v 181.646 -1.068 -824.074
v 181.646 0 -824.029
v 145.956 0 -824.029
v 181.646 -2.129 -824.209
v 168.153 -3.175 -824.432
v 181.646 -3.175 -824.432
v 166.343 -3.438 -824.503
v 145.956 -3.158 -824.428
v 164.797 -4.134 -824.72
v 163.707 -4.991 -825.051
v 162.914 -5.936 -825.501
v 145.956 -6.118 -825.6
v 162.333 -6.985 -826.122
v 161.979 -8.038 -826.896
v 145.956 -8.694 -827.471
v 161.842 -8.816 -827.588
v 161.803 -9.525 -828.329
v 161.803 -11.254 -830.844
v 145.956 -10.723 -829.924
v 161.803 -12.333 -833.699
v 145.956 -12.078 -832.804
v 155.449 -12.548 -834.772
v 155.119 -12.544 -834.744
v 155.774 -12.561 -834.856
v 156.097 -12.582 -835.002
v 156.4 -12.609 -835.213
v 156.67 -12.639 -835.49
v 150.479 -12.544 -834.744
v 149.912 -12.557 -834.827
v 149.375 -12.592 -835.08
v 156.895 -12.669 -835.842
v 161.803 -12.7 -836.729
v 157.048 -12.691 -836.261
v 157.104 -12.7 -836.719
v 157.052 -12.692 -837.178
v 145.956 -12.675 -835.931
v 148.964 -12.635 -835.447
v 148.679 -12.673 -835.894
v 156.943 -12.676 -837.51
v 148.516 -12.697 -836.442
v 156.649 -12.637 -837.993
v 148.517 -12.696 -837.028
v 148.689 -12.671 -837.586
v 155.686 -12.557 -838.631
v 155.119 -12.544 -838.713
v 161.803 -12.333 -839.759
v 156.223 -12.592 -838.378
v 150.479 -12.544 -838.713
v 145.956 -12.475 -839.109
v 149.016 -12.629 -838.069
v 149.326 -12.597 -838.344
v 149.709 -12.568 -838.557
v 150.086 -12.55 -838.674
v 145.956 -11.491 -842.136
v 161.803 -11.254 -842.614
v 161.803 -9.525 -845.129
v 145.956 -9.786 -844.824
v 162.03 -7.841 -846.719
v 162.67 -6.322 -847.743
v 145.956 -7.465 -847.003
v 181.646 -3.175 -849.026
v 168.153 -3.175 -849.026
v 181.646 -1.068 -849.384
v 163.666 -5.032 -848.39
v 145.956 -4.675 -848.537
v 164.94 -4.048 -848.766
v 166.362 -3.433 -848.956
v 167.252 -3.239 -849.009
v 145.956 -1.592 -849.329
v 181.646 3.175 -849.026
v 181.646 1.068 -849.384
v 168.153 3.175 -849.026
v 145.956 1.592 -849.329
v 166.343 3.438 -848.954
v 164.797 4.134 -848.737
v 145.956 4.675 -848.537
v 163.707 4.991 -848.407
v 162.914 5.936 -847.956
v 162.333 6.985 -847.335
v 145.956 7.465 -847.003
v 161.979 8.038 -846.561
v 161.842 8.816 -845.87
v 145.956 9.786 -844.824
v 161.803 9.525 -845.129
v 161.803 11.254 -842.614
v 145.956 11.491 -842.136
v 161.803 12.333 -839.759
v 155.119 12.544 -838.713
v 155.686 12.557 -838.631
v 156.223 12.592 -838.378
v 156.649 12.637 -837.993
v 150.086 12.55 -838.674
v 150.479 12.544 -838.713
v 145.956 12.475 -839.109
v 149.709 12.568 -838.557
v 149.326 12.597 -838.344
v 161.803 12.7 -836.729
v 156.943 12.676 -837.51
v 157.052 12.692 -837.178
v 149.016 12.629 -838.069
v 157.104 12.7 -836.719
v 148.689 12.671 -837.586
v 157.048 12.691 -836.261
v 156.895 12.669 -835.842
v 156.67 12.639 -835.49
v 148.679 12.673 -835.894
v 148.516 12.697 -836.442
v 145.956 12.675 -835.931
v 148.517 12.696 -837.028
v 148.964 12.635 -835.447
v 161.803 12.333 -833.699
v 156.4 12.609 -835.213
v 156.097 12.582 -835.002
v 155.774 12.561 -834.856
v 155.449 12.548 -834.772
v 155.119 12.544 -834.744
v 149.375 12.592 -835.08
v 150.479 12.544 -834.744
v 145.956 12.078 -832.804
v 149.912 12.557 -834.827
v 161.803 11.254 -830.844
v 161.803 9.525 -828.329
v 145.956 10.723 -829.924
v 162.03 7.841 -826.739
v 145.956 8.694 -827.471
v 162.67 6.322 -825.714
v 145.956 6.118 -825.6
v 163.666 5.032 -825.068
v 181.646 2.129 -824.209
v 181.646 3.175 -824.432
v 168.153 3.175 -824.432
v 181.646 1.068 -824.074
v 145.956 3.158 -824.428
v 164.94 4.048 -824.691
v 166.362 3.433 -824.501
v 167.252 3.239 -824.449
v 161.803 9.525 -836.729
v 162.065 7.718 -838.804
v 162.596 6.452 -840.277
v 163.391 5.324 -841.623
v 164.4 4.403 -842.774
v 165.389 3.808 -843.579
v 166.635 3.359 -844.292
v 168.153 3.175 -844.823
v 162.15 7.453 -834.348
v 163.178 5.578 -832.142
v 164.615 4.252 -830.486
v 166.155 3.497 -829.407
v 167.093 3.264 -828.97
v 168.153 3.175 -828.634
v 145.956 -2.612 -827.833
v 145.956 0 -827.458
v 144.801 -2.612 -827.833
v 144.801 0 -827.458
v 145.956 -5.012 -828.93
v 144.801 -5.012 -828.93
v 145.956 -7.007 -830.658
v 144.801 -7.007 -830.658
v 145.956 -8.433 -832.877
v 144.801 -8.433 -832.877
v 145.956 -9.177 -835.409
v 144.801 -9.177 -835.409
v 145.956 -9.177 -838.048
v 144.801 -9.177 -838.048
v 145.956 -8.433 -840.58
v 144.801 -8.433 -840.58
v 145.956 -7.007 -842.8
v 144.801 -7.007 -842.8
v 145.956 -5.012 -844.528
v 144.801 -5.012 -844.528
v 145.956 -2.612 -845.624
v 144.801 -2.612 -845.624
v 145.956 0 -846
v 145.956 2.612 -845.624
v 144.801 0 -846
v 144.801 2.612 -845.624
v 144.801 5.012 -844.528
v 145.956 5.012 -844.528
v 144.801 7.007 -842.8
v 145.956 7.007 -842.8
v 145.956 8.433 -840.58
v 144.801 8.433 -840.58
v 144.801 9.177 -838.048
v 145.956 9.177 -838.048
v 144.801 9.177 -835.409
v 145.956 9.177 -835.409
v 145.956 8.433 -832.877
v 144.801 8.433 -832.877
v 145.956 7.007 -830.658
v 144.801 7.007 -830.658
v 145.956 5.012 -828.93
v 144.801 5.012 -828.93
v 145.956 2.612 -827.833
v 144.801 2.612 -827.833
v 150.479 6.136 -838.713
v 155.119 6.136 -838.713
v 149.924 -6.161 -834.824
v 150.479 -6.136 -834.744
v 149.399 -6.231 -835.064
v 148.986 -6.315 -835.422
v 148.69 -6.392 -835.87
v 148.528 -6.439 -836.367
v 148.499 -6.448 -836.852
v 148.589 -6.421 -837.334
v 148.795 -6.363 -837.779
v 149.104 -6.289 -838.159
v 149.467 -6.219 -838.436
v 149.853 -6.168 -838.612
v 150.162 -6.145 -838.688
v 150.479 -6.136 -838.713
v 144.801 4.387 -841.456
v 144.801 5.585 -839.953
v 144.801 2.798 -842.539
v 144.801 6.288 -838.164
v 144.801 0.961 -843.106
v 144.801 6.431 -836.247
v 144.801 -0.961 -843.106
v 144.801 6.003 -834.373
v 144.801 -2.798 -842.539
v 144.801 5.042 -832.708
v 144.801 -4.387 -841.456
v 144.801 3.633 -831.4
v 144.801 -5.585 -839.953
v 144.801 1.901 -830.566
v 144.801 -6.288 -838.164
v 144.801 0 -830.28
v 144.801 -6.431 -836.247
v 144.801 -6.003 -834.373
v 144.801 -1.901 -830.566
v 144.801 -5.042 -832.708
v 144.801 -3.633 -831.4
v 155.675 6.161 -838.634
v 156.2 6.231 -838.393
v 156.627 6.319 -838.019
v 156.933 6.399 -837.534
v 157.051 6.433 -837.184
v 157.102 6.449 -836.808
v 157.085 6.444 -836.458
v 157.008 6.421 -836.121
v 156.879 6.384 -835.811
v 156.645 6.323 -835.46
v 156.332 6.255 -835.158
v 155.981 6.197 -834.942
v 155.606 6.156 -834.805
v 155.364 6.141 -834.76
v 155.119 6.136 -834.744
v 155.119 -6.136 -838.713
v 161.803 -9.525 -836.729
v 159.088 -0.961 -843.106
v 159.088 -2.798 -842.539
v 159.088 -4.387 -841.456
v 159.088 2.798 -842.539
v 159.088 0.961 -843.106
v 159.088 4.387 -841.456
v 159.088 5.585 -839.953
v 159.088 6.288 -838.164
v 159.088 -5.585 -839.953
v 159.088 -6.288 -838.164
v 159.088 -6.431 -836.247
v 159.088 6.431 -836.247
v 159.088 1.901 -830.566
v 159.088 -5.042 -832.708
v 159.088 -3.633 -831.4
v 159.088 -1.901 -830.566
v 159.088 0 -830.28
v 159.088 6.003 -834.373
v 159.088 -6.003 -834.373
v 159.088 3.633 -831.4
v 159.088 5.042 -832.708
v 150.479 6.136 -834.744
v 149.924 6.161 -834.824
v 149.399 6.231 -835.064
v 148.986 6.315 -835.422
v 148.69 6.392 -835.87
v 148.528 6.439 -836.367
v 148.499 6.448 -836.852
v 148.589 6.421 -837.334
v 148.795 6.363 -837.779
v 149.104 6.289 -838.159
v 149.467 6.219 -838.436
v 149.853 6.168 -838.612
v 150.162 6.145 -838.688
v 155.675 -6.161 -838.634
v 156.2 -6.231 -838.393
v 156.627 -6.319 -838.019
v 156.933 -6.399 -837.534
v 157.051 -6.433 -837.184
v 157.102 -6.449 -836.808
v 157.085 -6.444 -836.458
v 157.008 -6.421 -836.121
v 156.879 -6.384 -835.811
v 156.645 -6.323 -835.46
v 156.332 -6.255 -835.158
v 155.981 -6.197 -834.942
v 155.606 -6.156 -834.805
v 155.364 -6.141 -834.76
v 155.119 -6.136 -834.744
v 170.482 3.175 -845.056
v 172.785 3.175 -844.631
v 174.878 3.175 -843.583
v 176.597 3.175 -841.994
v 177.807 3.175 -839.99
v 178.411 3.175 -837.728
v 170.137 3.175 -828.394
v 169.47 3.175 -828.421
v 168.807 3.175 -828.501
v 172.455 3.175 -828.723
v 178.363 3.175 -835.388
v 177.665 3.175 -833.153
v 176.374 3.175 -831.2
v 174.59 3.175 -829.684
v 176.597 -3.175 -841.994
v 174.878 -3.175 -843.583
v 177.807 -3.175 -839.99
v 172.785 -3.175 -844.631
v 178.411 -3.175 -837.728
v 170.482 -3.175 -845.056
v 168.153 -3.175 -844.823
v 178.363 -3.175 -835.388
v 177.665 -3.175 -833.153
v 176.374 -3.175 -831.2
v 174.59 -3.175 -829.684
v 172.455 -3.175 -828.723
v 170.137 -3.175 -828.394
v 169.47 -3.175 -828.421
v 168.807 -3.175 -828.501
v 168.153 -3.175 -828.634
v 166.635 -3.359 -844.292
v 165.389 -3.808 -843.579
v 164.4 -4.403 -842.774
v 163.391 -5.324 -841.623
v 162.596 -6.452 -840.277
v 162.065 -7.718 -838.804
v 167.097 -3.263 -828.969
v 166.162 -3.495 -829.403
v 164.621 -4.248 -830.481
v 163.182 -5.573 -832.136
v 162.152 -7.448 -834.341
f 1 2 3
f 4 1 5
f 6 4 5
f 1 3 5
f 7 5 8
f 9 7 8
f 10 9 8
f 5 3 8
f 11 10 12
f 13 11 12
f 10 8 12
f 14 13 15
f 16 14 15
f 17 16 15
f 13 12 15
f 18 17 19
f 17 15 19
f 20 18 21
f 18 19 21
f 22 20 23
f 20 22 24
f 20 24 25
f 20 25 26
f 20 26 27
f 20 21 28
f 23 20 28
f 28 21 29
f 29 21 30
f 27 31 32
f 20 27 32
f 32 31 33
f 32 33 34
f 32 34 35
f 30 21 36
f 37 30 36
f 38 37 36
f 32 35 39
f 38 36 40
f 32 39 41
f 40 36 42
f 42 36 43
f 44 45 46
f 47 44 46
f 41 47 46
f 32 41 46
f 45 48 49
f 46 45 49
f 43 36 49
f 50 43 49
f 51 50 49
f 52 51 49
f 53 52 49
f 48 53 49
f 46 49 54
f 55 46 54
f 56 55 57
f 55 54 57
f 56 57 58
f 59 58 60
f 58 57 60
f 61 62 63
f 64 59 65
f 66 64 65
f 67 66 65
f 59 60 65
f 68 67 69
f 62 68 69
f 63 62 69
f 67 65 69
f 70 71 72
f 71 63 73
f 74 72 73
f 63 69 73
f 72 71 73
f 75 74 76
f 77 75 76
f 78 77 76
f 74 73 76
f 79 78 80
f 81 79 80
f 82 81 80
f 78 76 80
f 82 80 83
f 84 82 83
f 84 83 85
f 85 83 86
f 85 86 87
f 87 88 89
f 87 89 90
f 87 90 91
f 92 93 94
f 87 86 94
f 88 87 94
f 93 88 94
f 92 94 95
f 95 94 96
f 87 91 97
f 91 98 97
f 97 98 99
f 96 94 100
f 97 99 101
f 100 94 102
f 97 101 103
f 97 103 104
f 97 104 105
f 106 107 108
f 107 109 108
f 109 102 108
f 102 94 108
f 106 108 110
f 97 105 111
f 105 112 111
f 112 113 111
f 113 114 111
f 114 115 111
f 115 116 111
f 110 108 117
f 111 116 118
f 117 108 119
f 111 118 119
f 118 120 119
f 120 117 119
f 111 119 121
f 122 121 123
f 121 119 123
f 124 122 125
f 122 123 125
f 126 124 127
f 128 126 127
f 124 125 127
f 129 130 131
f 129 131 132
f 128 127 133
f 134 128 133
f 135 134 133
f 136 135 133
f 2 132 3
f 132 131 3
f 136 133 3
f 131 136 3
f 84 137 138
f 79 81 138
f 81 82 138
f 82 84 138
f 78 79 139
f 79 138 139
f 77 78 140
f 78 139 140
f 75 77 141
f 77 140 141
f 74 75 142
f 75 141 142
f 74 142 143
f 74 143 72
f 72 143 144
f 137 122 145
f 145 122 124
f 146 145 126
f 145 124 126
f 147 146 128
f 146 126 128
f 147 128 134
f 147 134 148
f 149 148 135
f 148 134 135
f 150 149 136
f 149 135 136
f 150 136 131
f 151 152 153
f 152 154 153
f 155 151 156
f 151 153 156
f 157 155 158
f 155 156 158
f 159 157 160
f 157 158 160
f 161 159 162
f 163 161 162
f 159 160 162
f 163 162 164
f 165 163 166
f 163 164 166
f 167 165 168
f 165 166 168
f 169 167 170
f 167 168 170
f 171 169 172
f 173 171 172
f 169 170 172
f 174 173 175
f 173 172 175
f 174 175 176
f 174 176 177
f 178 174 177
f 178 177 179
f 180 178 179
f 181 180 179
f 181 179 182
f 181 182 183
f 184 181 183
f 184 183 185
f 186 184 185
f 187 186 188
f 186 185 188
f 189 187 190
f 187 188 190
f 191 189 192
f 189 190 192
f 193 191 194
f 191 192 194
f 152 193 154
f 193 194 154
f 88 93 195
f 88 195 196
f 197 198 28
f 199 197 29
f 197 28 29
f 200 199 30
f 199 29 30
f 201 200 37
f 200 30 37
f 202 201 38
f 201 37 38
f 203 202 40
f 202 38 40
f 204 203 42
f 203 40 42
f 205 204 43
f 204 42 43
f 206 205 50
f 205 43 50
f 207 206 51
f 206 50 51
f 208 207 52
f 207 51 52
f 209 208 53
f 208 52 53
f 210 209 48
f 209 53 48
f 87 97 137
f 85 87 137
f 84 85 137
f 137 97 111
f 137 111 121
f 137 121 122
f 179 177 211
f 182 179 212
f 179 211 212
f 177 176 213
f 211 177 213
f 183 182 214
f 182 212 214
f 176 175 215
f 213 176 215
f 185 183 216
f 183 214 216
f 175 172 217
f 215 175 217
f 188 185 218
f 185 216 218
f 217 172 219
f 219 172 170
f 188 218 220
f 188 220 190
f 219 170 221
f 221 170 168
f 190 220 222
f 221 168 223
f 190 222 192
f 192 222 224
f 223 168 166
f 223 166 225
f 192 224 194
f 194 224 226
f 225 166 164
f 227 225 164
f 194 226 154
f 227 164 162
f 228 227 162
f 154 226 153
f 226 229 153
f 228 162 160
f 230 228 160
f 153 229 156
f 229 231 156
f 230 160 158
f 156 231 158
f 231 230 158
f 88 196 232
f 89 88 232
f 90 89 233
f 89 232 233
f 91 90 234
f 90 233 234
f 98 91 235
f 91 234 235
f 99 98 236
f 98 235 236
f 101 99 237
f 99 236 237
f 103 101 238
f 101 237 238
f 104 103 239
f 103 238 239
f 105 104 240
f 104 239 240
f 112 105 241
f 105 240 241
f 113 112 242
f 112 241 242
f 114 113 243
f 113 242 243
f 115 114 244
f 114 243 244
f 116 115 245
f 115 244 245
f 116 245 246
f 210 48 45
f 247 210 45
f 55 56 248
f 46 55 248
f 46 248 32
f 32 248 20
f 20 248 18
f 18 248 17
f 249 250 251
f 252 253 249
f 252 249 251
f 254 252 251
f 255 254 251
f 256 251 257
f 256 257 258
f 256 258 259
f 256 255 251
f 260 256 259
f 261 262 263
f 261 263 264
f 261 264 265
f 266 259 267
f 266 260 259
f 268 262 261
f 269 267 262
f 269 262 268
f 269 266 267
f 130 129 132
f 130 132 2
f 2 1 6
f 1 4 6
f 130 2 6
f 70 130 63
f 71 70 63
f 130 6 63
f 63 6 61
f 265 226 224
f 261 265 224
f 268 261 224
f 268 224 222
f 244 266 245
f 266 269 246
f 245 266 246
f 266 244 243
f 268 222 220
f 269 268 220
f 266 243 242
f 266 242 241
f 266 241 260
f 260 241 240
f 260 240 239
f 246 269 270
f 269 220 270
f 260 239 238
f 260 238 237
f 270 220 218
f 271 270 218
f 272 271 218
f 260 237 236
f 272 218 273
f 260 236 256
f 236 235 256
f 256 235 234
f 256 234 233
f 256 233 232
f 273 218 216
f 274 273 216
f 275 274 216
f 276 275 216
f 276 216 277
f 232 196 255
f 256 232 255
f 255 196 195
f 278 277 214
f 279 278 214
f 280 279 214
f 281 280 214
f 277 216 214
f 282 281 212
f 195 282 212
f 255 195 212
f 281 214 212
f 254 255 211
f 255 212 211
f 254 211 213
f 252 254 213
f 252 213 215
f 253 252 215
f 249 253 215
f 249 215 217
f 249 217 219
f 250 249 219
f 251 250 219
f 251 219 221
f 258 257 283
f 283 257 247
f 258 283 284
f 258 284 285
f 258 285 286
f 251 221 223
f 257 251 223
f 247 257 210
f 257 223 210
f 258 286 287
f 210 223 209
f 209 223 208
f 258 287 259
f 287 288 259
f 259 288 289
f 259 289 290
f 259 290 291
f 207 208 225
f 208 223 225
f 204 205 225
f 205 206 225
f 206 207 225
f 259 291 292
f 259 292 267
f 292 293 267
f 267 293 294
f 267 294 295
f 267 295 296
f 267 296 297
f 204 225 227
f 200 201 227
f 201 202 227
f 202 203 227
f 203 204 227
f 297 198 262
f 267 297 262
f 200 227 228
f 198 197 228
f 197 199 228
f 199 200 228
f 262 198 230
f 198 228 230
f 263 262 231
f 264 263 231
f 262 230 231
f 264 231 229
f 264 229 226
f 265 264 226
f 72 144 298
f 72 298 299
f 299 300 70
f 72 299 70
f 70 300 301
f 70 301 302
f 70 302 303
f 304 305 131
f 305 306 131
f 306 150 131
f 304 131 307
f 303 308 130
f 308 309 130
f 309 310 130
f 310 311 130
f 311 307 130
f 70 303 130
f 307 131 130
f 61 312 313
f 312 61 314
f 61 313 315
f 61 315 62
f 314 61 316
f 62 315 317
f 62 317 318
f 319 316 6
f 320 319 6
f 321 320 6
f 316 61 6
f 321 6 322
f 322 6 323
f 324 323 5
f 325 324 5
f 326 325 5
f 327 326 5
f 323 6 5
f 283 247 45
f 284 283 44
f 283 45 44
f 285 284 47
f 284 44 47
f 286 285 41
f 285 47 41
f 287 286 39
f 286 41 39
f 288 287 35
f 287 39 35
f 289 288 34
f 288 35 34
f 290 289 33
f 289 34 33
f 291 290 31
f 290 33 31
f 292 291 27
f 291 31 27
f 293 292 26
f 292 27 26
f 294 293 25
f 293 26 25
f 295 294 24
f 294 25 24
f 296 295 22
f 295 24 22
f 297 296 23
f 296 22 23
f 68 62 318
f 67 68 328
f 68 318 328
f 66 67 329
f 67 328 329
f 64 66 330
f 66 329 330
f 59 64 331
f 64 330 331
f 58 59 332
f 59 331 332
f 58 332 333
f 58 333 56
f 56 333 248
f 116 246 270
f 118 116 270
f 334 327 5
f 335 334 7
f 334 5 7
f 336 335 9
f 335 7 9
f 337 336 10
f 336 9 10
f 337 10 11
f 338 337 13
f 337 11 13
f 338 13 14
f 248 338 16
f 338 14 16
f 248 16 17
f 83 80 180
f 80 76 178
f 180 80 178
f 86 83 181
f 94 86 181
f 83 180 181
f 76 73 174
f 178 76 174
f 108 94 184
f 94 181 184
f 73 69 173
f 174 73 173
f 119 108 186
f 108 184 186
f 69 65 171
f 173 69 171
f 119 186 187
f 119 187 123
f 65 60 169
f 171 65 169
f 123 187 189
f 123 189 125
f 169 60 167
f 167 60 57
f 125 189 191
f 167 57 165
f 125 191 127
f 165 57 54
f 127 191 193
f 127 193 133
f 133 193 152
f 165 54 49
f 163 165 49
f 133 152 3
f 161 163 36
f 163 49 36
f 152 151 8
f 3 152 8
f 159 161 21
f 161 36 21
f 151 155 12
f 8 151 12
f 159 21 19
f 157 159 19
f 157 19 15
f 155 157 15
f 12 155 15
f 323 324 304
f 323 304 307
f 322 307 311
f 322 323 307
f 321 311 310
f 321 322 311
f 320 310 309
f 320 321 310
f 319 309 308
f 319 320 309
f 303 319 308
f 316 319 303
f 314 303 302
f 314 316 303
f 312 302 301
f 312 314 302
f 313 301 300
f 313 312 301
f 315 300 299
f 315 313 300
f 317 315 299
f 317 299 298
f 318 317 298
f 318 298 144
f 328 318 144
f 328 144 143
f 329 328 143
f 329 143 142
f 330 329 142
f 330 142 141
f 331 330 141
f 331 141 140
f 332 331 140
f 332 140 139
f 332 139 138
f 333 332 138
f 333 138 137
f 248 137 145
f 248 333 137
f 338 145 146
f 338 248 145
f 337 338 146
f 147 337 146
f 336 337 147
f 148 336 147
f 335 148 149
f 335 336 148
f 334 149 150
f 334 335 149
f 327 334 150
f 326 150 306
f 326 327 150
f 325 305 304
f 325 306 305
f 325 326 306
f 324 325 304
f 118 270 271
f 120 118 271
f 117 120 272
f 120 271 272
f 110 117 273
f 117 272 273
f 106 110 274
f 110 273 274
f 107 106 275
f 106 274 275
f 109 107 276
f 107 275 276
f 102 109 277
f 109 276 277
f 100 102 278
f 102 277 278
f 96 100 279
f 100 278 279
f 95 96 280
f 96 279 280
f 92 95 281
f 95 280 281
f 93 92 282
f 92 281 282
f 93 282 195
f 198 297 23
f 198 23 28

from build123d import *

# Parameters (mm, degrees)
CUT_EXTRUDE1_DEPTH      = 869.726648215
CUT_EXTRUDE1_DEPTH_BACK = 869.726648215
SKETCH2_3_R             = 8.334375
SKETCH3_R               = 6.44921875
CUT_EXTRUDE2_DEPTH      = 14.2875
CUT_EXTRUDE4_DEPTH      = 184.852841047


with BuildPart() as part:
    # Sketch2 one side → Revolve1 (revolve)
    with BuildSketch(Plane(origin=(0, 0, 0), x_dir=(1, 0, 0), z_dir=(0, 1, 0)), mode=Mode.PRIVATE) as revolve1_sk:
        with BuildLine():
            Line((161.802656837, 836.728797606), (178.471406837, 836.728797606))
            ThreePointArc((178.471406837, 836.728797606), (170.137031837, 845.063172606), (161.802656837, 836.728797606))
        make_face()
        with BuildLine():
            Line((155.119281837, 838.713172606), (150.479125, 838.713172606))
            ThreePointArc((150.479125, 838.713172606), (149.075959981, 838.131962625), (148.49475, 836.728797606))
            Line((148.49475, 836.728797606), (157.103656837, 836.728797606))
            ThreePointArc((157.103656837, 836.728797606), (156.522446856, 838.131962625), (155.119281837, 838.713172606))
        make_face()
        Polygon((144.800531837, 845.999797606), (144.800531837, 836.728797606), (181.646406837, 836.728797606), (181.646406837, 849.428797606), (145.956231837, 849.428797606), (145.956231837, 845.999797606), align=None)
    revolve(revolve1_sk.sketch.rotate(Axis((144.800531837, 0, -836.728797606), (1, 0, 0)), 180), axis=Axis((144.800531837, 0, -836.728797606), (1, 0, 0)))

    # Sketch2<3> → Cut-Extrude1 (cut, two sides: drawn at the far end of the back side and taken through both)
    with BuildSketch(Plane(origin=(0, 0, 0), x_dir=(1, 0, 0), z_dir=(0, 1, 0)).offset(-CUT_EXTRUDE1_DEPTH_BACK)):
        with Locations(Location((170.137031837, 836.728797606, 0), (0, 0, 270))):
            Circle(SKETCH2_3_R)
        with BuildLine():
            Line((150.479125, 838.713172606), (155.119281837, 838.713172606))
            ThreePointArc((155.119281837, 838.713172606), (157.103656837, 836.728797606), (155.119281837, 834.744422606))
            Line((155.119281837, 834.744422606), (150.479125, 834.744422606))
            ThreePointArc((150.479125, 834.744422606), (148.49475, 836.728797606), (150.479125, 838.713172606))
        make_face()
    extrude(amount=CUT_EXTRUDE1_DEPTH + CUT_EXTRUDE1_DEPTH_BACK, mode=Mode.SUBTRACT)

    # Sketch3 → Cut-Extrude2 (cut)
    with BuildSketch(Plane.ZY.offset(-144.800531837)):
        with Locations((-836.728797606, 0)):
            Circle(SKETCH3_R)
    extrude(amount=-CUT_EXTRUDE2_DEPTH, mode=Mode.SUBTRACT)

    # Sketch5 → Cut-Extrude4 (cut, through all)
    with BuildSketch(Plane.XY.offset(-824.028797606)):
        with BuildLine():
            Line((168.152656837, 3.175), (181.646406837, 3.175))
            Line((181.646406837, 3.175), (181.646406837, 12.7))
            Line((181.646406837, 12.7), (161.802656837, 12.7))
            Line((161.802656837, 12.7), (161.802656837, 9.525))
            ThreePointArc((161.802656837, 9.525), (163.662528777, 5.034871939), (168.152656837, 3.175))
        make_face()
        with BuildLine():
            Line((161.802656837, -12.7), (181.646406837, -12.7))
            Line((181.646406837, -12.7), (181.646406837, -3.175))
            Line((181.646406837, -3.175), (168.152656837, -3.175))
            ThreePointArc((168.152656837, -3.175), (163.662528777, -5.034871939), (161.802656837, -9.525))
            Line((161.802656837, -9.525), (161.802656837, -12.7))
        make_face()
    extrude(amount=-CUT_EXTRUDE4_DEPTH, mode=Mode.SUBTRACT)


solid = part.part
